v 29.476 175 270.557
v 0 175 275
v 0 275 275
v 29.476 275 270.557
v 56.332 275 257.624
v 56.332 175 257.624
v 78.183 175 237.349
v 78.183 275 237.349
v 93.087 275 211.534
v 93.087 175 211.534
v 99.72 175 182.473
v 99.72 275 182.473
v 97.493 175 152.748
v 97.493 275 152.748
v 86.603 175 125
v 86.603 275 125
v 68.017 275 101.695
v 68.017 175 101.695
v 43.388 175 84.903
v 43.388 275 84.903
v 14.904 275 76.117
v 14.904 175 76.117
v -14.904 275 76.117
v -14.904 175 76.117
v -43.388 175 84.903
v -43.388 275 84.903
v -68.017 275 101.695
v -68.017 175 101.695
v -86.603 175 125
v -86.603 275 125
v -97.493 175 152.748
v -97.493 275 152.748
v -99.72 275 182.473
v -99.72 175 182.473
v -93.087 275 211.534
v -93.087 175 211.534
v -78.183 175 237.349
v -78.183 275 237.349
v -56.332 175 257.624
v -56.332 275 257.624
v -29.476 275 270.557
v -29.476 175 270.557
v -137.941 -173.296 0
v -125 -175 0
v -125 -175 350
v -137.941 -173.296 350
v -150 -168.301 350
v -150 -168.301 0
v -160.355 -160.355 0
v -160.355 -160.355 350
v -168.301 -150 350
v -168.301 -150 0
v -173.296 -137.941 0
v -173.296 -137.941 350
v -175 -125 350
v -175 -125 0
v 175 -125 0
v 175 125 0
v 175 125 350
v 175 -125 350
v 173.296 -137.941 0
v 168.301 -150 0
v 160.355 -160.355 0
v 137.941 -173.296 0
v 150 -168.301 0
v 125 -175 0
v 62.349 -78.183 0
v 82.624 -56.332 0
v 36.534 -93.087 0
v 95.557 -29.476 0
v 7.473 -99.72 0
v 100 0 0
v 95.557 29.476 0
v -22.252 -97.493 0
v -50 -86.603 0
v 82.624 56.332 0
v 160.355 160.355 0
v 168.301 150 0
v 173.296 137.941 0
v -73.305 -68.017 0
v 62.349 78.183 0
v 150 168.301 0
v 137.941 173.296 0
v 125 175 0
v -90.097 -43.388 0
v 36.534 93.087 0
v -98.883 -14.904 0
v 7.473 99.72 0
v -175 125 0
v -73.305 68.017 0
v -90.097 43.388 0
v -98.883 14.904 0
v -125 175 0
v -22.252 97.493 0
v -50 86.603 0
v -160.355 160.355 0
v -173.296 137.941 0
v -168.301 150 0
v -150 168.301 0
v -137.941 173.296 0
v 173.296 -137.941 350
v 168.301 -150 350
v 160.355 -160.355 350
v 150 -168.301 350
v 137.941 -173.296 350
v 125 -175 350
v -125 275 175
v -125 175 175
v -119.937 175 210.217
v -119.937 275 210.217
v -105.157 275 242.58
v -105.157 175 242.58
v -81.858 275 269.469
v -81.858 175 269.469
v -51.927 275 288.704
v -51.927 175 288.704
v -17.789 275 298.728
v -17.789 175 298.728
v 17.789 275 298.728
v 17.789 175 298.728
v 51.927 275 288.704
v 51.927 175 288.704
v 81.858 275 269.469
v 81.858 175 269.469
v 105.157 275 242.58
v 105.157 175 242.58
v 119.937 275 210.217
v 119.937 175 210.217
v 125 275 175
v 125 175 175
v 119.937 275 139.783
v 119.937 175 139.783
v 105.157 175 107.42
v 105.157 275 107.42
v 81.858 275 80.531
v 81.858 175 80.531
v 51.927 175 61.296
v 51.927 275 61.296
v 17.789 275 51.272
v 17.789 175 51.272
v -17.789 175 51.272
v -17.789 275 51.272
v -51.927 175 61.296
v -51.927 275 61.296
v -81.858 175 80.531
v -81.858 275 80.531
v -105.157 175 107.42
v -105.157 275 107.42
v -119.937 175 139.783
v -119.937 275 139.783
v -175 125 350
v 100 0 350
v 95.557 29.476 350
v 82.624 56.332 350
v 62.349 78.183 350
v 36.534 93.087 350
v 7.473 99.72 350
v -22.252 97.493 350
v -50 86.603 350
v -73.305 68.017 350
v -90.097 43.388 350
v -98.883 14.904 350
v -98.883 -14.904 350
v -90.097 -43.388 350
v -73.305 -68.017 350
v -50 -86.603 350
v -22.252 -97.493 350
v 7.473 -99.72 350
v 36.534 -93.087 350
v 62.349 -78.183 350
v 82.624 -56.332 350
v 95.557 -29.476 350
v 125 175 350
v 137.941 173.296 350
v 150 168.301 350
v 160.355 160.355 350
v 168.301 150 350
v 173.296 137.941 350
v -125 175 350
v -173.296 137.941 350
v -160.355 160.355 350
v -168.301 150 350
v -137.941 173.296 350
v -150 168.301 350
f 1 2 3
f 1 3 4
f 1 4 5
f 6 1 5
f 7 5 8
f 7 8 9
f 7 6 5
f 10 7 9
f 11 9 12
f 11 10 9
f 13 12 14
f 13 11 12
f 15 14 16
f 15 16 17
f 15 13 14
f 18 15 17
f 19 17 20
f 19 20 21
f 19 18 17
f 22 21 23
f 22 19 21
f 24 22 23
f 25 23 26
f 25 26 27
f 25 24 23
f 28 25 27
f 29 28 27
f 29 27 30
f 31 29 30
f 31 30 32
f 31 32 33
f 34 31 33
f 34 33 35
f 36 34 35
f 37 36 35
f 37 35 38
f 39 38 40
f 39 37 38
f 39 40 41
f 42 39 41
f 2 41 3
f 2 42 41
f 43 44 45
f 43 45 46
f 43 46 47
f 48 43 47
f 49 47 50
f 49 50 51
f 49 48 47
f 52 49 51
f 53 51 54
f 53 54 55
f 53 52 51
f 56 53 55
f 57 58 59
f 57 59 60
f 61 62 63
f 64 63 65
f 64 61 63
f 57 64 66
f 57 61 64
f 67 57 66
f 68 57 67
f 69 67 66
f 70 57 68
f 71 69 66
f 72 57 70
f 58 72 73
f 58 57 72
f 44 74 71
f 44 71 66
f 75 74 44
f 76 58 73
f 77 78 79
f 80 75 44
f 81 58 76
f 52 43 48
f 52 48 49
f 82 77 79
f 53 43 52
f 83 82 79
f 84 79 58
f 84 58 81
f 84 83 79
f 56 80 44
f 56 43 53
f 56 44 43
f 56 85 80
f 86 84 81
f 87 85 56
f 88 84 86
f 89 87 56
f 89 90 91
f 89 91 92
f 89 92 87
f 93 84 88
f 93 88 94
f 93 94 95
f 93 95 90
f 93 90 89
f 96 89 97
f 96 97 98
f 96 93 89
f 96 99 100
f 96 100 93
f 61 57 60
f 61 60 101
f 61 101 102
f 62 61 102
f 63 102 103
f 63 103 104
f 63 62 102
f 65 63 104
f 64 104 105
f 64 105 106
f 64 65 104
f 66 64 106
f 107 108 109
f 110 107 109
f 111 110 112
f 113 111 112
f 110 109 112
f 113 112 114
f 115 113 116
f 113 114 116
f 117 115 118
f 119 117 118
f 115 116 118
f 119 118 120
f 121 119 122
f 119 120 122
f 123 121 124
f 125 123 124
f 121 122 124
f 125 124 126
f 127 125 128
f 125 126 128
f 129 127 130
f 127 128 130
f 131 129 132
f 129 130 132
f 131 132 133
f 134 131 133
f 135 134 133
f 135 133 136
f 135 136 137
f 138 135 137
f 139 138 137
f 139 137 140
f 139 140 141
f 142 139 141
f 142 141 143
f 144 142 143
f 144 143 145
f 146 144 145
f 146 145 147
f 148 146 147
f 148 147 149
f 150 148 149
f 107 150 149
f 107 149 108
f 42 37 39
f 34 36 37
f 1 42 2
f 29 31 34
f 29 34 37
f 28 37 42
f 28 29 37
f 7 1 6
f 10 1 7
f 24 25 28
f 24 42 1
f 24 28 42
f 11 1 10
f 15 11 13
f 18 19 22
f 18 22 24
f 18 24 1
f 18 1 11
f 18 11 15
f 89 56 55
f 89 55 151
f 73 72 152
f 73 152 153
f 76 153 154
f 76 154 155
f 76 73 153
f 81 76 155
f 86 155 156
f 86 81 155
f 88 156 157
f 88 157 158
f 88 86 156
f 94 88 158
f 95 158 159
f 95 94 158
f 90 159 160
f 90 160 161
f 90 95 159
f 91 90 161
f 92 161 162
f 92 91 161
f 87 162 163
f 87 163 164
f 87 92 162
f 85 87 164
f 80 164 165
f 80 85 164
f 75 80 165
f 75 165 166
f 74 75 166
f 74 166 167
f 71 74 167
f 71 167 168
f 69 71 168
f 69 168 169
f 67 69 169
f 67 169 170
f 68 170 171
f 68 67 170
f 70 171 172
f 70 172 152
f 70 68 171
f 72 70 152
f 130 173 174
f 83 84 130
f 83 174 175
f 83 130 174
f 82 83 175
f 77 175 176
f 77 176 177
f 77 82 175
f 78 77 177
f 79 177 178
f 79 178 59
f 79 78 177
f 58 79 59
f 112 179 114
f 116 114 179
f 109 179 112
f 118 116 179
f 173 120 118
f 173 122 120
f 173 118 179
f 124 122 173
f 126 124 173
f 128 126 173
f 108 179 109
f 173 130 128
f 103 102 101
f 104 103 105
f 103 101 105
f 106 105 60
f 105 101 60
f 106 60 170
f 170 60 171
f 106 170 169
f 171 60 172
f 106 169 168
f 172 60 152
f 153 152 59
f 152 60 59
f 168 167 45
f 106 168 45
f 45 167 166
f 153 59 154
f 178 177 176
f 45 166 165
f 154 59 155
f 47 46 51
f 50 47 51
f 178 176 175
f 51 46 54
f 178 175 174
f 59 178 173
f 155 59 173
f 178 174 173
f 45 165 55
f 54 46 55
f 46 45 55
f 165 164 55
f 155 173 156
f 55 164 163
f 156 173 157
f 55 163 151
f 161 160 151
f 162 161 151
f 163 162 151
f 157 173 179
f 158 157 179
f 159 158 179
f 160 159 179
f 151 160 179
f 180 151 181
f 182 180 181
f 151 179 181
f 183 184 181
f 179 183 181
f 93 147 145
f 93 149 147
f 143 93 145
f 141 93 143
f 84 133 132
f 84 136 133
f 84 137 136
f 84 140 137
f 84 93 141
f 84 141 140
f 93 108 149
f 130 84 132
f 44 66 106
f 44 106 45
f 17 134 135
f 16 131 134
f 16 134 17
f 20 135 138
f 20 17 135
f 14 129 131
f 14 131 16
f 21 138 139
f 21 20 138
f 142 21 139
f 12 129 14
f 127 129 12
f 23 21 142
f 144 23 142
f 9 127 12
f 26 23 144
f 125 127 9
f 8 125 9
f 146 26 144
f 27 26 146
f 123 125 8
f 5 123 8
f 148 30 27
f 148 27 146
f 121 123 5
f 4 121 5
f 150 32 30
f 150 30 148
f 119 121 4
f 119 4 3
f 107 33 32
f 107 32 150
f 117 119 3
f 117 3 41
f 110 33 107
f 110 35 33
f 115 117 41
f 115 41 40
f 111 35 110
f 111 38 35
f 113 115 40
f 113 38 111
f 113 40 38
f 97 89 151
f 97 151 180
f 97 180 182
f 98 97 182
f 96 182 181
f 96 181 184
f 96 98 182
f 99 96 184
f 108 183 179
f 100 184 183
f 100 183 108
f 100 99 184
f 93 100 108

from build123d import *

# Parameters (mm, degrees)
SKETCH1_R           = 100
BOSS_EXTRUDE1_DEPTH = 350
SKETCH2_R           = 125
SKETCH2_R_2         = 100
BOSS_EXTRUDE2_DEPTH = 100


with BuildPart() as part:
    # Sketch1 → Boss-Extrude1 (new body)
    with BuildSketch(Plane.XY):
        with BuildLine():
            Line((-125, 175), (125, 175))
            ThreePointArc((125, 175), (160.355339059, 160.355339059), (175, 125))
            Line((175, 125), (175, -125))
            ThreePointArc((175, -125), (160.355339059, -160.355339059), (125, -175))
            Line((125, -175), (-125, -175))
            ThreePointArc((-125, -175), (-160.355339059, -160.355339059), (-175, -125))
            Line((-175, -125), (-175, 125))
            ThreePointArc((-175, 125), (-160.355339059, 160.355339059), (-125, 175))
        make_face()
        Circle(SKETCH1_R, mode=Mode.SUBTRACT)
    extrude(amount=BOSS_EXTRUDE1_DEPTH)

    # Sketch2 → Boss-Extrude2 (add)
    with BuildSketch(Plane(origin=(0, 175, 0), x_dir=(1, 0, 0), z_dir=(0, 1, 0))):
        with Locations(Location((0, -175, 0), (0, 0, 180))):
            Circle(SKETCH2_R)
        with Locations(Location((0, -175, 0), (0, 0, 270))):
            Circle(SKETCH2_R_2, mode=Mode.SUBTRACT)
    extrude(amount=BOSS_EXTRUDE2_DEPTH)


solid = part.part
